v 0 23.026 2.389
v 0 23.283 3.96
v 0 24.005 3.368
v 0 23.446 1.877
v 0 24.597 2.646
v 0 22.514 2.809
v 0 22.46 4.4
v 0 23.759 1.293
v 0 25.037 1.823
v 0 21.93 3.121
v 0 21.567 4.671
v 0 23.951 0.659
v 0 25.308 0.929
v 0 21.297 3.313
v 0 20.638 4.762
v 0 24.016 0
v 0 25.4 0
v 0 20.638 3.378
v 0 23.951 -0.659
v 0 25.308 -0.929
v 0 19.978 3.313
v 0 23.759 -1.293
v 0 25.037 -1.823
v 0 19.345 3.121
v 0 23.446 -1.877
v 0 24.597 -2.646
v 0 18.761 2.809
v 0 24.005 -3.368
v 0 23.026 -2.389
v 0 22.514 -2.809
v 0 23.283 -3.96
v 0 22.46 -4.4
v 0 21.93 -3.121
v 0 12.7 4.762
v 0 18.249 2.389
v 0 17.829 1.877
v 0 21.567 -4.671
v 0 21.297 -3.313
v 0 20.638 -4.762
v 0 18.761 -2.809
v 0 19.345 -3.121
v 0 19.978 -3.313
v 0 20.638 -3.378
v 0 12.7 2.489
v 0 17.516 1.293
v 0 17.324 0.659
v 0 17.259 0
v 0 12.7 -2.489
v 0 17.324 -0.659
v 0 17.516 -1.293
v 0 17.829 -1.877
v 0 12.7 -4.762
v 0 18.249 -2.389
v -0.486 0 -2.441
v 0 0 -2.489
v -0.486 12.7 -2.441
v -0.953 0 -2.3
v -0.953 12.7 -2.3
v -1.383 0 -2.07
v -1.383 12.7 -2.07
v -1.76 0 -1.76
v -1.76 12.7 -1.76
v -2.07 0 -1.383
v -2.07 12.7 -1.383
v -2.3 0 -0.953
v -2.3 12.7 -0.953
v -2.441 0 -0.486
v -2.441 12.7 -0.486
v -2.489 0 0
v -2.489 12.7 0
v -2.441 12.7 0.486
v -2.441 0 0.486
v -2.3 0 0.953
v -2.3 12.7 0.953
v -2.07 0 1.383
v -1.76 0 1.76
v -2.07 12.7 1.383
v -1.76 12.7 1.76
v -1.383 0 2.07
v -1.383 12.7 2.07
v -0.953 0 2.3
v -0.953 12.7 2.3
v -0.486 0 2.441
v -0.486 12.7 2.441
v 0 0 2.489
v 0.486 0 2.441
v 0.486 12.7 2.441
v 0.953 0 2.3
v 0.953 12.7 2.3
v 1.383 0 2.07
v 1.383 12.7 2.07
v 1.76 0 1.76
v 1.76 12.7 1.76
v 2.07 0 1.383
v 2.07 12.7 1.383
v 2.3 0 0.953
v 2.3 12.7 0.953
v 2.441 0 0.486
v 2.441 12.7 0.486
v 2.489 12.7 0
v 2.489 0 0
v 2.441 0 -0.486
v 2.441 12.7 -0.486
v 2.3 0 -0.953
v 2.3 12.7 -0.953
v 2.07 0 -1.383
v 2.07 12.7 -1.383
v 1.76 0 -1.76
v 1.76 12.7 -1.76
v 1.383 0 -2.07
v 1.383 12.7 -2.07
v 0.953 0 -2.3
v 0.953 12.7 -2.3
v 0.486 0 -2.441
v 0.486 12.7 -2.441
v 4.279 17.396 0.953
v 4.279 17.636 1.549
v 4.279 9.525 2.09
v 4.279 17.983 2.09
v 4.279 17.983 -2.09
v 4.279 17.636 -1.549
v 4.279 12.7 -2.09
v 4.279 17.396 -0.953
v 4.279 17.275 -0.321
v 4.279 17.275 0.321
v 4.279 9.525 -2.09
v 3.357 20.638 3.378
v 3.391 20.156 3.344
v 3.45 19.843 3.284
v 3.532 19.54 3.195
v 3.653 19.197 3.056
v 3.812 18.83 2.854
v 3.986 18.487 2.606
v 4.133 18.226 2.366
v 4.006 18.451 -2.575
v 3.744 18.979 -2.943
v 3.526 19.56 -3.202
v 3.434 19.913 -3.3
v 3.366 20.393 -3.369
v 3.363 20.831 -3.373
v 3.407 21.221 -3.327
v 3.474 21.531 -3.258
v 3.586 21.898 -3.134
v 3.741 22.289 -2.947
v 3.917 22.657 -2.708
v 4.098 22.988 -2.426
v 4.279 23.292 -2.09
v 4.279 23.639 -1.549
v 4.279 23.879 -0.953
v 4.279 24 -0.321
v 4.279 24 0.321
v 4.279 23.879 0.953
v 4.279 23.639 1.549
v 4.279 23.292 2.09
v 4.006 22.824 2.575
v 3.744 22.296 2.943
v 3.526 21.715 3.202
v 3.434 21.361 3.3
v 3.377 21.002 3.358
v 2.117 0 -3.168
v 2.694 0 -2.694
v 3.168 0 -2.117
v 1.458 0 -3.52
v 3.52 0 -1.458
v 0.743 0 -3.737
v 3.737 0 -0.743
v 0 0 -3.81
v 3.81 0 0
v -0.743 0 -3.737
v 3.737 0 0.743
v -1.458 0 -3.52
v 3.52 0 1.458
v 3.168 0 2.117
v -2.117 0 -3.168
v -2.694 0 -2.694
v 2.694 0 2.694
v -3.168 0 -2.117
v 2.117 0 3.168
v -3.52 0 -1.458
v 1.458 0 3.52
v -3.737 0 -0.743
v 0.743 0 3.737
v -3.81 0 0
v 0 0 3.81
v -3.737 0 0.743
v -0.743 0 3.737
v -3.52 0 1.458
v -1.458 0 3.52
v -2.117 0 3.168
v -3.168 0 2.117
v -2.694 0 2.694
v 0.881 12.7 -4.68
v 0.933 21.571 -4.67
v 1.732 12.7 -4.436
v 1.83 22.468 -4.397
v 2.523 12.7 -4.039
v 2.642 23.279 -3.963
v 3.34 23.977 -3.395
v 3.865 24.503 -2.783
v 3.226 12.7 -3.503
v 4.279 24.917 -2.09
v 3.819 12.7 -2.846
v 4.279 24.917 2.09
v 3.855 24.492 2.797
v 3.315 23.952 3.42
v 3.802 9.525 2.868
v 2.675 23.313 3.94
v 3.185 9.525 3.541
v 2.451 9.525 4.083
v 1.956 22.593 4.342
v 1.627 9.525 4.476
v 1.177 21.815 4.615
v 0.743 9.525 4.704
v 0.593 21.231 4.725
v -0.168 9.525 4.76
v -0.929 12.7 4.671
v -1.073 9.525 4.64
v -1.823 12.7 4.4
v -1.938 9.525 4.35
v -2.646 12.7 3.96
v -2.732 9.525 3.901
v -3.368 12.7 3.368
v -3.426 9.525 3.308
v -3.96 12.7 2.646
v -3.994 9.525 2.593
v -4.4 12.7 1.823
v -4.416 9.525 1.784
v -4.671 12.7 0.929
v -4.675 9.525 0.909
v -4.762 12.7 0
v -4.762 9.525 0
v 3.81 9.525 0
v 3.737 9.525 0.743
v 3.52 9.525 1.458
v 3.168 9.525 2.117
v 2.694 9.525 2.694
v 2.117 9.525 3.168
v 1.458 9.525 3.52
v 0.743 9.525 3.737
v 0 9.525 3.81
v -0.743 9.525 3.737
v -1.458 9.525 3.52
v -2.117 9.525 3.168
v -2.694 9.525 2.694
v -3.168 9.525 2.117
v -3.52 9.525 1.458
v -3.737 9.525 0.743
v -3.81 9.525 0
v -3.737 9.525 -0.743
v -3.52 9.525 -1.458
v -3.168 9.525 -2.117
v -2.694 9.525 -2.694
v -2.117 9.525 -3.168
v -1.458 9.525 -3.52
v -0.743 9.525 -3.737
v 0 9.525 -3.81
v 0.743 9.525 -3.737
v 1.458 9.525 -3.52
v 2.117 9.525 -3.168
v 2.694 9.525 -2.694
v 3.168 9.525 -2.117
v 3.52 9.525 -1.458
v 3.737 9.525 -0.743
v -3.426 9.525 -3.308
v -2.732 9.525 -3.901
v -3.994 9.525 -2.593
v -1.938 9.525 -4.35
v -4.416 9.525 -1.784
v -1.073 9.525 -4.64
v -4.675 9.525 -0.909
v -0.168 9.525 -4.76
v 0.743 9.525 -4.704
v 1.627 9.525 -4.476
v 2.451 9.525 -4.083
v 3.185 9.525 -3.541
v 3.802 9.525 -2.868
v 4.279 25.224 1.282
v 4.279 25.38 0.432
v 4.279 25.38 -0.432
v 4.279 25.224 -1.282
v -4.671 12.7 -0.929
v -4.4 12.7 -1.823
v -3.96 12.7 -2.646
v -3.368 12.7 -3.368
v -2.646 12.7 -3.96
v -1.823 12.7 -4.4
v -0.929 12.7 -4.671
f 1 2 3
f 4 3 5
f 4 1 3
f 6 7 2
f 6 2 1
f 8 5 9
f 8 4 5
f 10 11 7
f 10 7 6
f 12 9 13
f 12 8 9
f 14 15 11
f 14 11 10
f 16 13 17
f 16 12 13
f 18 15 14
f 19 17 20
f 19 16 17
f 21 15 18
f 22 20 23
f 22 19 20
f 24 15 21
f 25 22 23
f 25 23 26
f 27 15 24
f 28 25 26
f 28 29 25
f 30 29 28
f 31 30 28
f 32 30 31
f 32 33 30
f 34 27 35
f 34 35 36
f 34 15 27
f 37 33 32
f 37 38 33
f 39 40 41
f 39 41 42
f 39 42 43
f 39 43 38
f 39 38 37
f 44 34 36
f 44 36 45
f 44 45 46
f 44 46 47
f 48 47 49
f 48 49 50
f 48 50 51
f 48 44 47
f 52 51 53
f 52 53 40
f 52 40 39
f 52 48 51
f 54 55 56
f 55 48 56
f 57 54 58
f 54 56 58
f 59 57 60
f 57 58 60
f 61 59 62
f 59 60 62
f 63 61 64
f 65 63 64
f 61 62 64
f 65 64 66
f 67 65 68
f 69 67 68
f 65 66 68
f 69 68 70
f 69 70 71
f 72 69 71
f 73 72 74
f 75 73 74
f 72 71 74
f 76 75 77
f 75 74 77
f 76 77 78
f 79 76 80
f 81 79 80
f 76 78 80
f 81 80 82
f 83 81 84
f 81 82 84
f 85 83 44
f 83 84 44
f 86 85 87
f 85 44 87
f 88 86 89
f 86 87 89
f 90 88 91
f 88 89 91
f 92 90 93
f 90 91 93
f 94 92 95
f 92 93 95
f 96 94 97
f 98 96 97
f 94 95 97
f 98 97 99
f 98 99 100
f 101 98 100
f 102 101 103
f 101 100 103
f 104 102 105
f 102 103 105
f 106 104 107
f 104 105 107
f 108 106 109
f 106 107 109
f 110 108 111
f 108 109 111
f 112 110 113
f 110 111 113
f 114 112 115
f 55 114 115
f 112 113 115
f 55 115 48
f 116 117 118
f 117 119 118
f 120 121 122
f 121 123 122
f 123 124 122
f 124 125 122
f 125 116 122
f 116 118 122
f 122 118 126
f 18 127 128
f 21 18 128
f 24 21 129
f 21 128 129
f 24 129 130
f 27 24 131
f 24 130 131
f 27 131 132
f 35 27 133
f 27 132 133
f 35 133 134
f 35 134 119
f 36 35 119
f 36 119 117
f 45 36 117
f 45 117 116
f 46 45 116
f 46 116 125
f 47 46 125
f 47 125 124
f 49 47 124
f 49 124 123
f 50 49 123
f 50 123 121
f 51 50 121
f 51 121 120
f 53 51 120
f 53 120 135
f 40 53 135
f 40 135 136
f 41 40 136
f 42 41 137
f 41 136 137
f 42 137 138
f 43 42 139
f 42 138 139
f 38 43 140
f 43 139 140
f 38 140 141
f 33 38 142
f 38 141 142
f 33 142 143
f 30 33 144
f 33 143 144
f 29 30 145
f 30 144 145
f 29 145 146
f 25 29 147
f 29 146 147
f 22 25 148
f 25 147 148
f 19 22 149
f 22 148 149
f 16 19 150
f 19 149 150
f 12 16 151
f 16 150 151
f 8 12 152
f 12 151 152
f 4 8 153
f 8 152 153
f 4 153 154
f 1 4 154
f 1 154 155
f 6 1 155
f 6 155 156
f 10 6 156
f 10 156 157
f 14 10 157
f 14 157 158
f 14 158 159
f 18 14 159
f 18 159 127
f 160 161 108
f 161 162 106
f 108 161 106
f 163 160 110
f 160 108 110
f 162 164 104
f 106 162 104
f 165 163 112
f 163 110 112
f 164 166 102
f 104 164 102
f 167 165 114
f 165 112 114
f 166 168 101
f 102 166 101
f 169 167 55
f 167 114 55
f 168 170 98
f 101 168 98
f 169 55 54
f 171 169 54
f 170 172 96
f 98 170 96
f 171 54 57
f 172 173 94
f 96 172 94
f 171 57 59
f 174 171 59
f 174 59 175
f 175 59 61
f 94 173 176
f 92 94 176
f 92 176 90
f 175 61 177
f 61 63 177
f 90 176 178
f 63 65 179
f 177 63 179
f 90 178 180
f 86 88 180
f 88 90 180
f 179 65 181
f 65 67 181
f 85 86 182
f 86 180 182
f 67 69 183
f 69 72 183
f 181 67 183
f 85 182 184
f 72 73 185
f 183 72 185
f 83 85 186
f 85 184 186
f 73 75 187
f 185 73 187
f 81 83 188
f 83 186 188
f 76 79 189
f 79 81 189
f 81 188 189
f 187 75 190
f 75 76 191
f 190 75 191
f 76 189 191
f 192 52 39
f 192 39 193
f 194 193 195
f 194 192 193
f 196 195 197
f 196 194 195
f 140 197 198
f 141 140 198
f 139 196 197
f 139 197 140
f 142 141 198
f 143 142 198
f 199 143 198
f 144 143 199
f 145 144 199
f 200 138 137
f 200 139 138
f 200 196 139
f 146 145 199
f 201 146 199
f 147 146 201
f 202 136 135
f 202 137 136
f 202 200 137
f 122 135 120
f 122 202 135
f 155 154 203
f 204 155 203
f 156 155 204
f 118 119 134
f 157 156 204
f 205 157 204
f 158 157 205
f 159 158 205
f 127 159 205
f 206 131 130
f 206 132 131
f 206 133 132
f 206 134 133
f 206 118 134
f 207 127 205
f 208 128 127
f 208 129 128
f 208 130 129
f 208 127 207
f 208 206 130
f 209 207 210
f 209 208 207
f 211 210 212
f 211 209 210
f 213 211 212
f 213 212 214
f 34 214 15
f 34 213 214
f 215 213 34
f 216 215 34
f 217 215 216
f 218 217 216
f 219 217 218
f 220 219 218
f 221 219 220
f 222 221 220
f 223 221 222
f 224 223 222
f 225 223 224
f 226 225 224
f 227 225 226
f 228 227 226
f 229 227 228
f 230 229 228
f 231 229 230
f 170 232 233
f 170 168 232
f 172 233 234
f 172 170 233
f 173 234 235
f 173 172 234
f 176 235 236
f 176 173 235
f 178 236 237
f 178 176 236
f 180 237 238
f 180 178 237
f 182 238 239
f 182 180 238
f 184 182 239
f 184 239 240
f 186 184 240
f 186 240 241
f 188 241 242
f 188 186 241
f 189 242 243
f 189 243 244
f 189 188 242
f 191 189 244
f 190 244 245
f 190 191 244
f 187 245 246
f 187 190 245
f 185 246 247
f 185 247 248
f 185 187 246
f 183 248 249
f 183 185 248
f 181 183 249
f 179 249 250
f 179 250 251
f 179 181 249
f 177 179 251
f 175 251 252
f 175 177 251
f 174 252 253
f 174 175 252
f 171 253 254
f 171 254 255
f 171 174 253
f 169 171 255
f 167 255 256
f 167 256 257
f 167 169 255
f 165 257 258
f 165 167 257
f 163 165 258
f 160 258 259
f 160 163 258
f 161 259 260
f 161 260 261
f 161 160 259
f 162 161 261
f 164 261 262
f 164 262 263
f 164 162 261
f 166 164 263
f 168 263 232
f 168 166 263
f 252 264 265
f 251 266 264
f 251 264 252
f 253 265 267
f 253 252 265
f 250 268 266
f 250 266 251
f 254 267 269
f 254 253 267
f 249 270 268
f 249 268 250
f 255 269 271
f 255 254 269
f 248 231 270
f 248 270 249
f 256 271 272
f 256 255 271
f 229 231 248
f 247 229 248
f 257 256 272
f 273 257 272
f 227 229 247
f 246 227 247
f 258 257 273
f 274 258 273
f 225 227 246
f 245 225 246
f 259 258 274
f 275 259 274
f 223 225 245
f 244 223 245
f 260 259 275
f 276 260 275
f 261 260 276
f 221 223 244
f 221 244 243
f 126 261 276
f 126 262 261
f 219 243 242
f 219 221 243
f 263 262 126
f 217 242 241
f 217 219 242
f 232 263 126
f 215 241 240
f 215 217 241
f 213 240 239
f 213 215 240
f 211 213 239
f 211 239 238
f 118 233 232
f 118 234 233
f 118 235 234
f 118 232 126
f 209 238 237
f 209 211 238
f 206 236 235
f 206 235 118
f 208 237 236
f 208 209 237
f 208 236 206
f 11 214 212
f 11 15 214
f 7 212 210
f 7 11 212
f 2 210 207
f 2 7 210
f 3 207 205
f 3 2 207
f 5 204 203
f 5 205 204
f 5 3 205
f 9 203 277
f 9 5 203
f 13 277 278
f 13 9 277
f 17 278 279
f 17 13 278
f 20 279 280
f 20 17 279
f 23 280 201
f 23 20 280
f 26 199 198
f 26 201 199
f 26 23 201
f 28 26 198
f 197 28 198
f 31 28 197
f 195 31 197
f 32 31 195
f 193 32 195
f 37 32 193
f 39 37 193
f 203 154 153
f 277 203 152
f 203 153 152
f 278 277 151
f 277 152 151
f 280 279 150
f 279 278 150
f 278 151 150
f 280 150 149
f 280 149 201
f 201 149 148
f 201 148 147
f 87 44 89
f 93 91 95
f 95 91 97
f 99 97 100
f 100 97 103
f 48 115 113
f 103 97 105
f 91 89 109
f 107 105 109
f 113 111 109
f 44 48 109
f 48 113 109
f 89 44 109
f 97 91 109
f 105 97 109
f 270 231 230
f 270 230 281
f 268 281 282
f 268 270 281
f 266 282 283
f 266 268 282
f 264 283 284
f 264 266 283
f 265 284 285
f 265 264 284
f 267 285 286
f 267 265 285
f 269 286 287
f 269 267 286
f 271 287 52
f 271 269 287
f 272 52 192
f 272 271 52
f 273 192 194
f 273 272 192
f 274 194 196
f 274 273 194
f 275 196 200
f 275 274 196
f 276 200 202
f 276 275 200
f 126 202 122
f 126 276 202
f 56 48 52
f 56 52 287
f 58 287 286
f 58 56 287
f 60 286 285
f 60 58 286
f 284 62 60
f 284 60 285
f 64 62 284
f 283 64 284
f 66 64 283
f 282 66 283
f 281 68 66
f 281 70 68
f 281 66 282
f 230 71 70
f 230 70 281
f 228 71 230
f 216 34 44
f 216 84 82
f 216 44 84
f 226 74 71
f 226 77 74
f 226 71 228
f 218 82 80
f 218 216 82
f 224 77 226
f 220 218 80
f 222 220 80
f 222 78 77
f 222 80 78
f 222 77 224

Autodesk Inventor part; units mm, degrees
ref_plane "YZ Plane" through (0, 0, 0) normal (1, 0, 0) x (0, 1, 0)
ref_plane "XZ Plane" through (0, 0, 0) normal (0, 1, 0) x (-1, 0, 0)
ref_plane "XY Plane" through (0, 0, 0) normal (0, 0, 1) x (1, 0, 0)
sketch "Sketch1" plane through (0, 0, 0) normal (0, 1, 0) x (-1, 0, 0)
  circle A0 centre (0, 0) radius 4.7625
  dimension "d0" = 9.525
extrude "Extrusion1" add sketch "Sketch1" along normal blind 12.7
sketch "Sketch2" plane through (0, 0, 0) normal (0, -1, 0) x (1, 0, 0)
  circle A0 centre (0, 0) radius 2.539
hole "Hole1" at (0, 0, 0) direction (0, 1, 0) diameter 4.9784 depth 19.05 tip angle 118 thread size "1/4-20 UNC" class "2B" standard "ANSI Unified Screw Threads"
sketch "Sketch3" plane through (0, 12.7, 0) normal (0, 1, 0) x (1, 0, 0)
  circle A0 centre (0, 0) radius 4.7625
  circle A1 centre (0, 0) radius 4.7625 projected
  line L0 (0, -4.7625) -> (0, 4.7625)
  dimension "d10" = 9.525
extrude "Extrusion2" add sketch "Sketch3" along normal blind 12.7 contours A0 L0 picked at (1.6786, -1.3984)
sketch "Sketch4" plane through (0, 12.7, -2.4892) normal (-1, 0, 0) x (0, 0, 1)
  line L0 (-2.2733, 0) -> (-2.2733, 12.7) projected
  line L1 (7.2517, 0) -> (7.2517, 12.7) projected
  line L2 (-2.2733, 0) -> (7.2517, 0)
  line L3 (7.2517, 0) -> (7.2517, 12.7)
  line L4 (7.2517, 12.7) -> (-2.2733, 12.7)
  line L5 (-2.2733, 12.7) -> (-2.2733, 0)
  arc A0 (7.2517, 7.9375) -> (-2.2733, 7.9375) centre (2.4892, 7.9375) ccw
  line L6 (7.2517, 12.7) -> (-2.2733, 12.7) projected
  line L7 (-2.2733, 7.9375) -> (-2.2733, 12.7)
  line L8 (-2.2733, 12.7) -> (7.2517, 12.7)
  line L9 (7.2517, 12.7) -> (7.2517, 7.9375)
  point P0 (2.4892, -12.7)
extrude "Extrusion3" cut sketch "Sketch4" against normal blind 12.7 contours L0 L4 A0 | L4 L1 A0
sketch "Sketch5" plane through (0, 12.7, -2.4892) normal (-1, 0, 0) x (0, 0, 1)
  arc A0 (7.2517, 7.9375) -> (-2.2733, 7.9375) centre (2.4892, 7.9375) ccw projected
  circle A1 centre (2.4892, 7.9375) radius 2.2013
  point P0 (2.4892, -12.7)
hole "Hole2" at (0, 20.6375, 0) direction (1, 0, 0) diameter 6.7564 depth 19.05 tip angle 118 clearance for "Flat Head Machine Screw (82)" size "1/4" standard "Ansi Unified Screw Threads"
sketch "Sketch6" plane through (0, 0, 0) normal (0, -1, 0) x (1, 0, 0)
  line L0 (0, 0) -> (4.7909, 0)
  line L1 (5.3024, 5.1468) -> (4.2794, 5.1468)
  line L2 (4.2794, 5.1468) -> (4.2794, -5.1468)
  line L3 (4.2794, -5.1468) -> (5.3024, -5.1468)
  line L4 (5.3024, -5.1468) -> (5.3024, 5.1468)
  line L5 (5.3024, 5.1468) -> (4.2794, -5.1468) construction
  line L6 (4.2794, 5.1468) -> (5.3024, -5.1468) construction
extrude "Extrusion4" cut sketch "Sketch6" against normal blind 25.4
sketch "Sketch7" plane through (0, 0, 0) normal (0, -1, 0) x (1, 0, 0)
  circle A0 centre (0, 0) radius 4.7625
  circle A1 centre (0, 0) radius 3.81
  dimension "d24" = 9.525
  dimension "d25" = 7.62
extrude "Extrusion5" cut sketch "Sketch7" against normal blind 9.525
properties part number "feet type 3 part 2" material "Stainless Steel"
